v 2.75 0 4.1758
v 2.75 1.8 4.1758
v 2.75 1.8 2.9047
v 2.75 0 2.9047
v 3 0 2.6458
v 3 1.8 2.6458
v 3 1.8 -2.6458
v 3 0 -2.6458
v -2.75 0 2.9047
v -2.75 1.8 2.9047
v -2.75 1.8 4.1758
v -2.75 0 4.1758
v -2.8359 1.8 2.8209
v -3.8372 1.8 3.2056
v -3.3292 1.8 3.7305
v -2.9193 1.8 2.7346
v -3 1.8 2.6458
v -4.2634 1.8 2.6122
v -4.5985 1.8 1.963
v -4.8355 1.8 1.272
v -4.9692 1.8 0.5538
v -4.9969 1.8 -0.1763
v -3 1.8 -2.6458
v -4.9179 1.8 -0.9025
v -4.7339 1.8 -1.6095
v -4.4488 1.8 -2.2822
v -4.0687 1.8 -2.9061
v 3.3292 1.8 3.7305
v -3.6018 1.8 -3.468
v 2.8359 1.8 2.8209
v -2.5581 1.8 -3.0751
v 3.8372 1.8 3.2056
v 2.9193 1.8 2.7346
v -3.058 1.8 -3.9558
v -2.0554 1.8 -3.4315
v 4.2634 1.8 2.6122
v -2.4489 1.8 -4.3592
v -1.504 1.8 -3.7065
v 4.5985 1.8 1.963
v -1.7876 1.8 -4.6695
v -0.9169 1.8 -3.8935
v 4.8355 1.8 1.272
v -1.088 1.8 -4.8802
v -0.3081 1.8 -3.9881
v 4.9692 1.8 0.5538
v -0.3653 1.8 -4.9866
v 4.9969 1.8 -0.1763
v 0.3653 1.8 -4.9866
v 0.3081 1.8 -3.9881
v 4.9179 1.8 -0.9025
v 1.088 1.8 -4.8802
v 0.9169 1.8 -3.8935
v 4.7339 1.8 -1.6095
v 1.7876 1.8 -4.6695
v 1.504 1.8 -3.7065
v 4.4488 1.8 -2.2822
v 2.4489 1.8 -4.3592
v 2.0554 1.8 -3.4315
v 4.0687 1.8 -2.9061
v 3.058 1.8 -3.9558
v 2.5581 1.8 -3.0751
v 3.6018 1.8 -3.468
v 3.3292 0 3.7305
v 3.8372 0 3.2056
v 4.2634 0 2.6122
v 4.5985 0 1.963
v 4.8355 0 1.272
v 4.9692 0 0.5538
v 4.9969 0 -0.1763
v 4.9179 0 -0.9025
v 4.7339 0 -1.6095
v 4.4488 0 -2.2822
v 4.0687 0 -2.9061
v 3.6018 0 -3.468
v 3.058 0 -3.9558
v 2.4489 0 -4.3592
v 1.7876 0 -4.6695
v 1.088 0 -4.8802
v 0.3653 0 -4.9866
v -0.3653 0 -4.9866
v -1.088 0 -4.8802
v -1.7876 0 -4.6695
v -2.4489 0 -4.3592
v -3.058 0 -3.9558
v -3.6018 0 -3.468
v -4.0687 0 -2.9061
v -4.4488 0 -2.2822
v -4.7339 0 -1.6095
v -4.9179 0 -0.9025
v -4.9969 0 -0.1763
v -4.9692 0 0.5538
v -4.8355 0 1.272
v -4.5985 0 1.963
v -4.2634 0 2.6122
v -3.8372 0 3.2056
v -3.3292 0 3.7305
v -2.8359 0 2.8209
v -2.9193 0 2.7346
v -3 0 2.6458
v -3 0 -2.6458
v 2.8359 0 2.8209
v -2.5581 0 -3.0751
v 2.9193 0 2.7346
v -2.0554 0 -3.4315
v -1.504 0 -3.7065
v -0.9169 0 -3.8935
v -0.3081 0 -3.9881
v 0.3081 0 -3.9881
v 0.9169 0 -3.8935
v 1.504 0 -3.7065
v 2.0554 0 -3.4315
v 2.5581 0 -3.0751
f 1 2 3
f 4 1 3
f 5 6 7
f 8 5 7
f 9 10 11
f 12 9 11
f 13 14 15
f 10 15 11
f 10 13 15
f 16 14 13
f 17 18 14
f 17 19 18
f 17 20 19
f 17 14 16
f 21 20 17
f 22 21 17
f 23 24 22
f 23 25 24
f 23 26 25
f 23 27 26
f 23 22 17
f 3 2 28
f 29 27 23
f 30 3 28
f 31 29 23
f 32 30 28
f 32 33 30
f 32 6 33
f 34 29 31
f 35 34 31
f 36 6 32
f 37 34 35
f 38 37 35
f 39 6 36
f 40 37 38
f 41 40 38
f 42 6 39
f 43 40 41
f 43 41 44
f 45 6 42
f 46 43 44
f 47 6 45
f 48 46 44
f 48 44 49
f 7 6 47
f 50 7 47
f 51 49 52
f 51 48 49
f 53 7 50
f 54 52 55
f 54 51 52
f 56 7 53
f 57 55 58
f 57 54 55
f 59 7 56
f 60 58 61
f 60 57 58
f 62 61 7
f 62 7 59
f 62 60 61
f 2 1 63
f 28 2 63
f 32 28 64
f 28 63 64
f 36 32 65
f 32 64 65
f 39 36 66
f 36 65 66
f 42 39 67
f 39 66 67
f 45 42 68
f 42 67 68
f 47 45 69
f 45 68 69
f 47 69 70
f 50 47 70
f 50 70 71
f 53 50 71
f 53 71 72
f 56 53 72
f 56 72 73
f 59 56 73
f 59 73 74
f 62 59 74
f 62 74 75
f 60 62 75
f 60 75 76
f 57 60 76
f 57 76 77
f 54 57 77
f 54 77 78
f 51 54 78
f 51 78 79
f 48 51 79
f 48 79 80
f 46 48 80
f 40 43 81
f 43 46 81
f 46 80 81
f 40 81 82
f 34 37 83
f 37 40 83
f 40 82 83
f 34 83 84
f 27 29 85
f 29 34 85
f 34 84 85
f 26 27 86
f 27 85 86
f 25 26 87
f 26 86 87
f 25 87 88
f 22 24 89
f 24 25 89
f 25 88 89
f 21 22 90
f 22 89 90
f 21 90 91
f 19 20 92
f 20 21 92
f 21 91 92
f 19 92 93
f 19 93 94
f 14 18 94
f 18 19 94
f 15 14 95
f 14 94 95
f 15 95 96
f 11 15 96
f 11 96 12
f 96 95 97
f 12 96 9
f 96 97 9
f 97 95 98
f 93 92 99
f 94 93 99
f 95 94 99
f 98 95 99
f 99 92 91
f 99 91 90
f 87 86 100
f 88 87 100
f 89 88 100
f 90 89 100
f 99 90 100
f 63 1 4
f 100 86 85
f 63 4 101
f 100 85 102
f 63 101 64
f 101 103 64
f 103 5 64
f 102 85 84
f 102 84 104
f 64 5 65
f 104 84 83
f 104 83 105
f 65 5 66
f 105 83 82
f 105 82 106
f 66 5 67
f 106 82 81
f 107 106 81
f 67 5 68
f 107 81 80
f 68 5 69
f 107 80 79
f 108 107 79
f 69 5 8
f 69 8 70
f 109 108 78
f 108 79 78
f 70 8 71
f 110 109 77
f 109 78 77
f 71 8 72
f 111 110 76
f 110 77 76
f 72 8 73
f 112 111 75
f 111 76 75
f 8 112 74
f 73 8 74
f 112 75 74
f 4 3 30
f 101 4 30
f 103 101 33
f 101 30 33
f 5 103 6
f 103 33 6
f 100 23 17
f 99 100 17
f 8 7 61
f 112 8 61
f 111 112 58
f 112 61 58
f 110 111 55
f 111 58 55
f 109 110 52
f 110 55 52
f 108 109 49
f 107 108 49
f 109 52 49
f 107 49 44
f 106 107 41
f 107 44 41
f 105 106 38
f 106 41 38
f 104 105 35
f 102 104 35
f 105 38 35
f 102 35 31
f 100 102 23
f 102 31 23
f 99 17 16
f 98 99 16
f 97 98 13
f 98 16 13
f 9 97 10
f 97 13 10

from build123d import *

# Parameters (mm, degrees)
SKETCH1_R           = 5
BOSS_EXTRUDE1_DEPTH = 1.8
CUT_EXTRUDE1_DEPTH  = 2.8


with BuildPart() as part:
    # Sketch1 → Boss-Extrude1 (new body)
    with BuildSketch(Plane(origin=(0, 0, 0), x_dir=(1, 0, 0), z_dir=(0, 1, 0))):
        Circle(SKETCH1_R)
    extrude(amount=BOSS_EXTRUDE1_DEPTH)

    # Sketch2 → Cut-Extrude1 (cut, through all)
    with BuildSketch(Plane(origin=(0, 1.8, 0), x_dir=(1, 0, 0), z_dir=(0, 1, 0))):
        with BuildLine():
            Line((-3, 2.645751311), (-3, -2.645751311))
            ThreePointArc((-3, -2.645751311), (-2.877914777, -2.778058051), (-2.75, -2.90473751))
            Line((-2.75, -2.90473751), (-2.75, -4.175823272))
            ThreePointArc((-2.75, -4.175823272), (0, -5), (2.75, -4.175823272))
            Line((2.75, -4.175823272), (2.75, -2.90473751))
            ThreePointArc((2.75, -2.90473751), (2.877914777, -2.778058051), (3, -2.645751311))
            Line((3, -2.645751311), (3, 2.645751311))
            ThreePointArc((3, 2.645751311), (0, 4), (-3, 2.645751311))
        make_face()
    extrude(amount=-CUT_EXTRUDE1_DEPTH, mode=Mode.SUBTRACT)


solid = part.part
